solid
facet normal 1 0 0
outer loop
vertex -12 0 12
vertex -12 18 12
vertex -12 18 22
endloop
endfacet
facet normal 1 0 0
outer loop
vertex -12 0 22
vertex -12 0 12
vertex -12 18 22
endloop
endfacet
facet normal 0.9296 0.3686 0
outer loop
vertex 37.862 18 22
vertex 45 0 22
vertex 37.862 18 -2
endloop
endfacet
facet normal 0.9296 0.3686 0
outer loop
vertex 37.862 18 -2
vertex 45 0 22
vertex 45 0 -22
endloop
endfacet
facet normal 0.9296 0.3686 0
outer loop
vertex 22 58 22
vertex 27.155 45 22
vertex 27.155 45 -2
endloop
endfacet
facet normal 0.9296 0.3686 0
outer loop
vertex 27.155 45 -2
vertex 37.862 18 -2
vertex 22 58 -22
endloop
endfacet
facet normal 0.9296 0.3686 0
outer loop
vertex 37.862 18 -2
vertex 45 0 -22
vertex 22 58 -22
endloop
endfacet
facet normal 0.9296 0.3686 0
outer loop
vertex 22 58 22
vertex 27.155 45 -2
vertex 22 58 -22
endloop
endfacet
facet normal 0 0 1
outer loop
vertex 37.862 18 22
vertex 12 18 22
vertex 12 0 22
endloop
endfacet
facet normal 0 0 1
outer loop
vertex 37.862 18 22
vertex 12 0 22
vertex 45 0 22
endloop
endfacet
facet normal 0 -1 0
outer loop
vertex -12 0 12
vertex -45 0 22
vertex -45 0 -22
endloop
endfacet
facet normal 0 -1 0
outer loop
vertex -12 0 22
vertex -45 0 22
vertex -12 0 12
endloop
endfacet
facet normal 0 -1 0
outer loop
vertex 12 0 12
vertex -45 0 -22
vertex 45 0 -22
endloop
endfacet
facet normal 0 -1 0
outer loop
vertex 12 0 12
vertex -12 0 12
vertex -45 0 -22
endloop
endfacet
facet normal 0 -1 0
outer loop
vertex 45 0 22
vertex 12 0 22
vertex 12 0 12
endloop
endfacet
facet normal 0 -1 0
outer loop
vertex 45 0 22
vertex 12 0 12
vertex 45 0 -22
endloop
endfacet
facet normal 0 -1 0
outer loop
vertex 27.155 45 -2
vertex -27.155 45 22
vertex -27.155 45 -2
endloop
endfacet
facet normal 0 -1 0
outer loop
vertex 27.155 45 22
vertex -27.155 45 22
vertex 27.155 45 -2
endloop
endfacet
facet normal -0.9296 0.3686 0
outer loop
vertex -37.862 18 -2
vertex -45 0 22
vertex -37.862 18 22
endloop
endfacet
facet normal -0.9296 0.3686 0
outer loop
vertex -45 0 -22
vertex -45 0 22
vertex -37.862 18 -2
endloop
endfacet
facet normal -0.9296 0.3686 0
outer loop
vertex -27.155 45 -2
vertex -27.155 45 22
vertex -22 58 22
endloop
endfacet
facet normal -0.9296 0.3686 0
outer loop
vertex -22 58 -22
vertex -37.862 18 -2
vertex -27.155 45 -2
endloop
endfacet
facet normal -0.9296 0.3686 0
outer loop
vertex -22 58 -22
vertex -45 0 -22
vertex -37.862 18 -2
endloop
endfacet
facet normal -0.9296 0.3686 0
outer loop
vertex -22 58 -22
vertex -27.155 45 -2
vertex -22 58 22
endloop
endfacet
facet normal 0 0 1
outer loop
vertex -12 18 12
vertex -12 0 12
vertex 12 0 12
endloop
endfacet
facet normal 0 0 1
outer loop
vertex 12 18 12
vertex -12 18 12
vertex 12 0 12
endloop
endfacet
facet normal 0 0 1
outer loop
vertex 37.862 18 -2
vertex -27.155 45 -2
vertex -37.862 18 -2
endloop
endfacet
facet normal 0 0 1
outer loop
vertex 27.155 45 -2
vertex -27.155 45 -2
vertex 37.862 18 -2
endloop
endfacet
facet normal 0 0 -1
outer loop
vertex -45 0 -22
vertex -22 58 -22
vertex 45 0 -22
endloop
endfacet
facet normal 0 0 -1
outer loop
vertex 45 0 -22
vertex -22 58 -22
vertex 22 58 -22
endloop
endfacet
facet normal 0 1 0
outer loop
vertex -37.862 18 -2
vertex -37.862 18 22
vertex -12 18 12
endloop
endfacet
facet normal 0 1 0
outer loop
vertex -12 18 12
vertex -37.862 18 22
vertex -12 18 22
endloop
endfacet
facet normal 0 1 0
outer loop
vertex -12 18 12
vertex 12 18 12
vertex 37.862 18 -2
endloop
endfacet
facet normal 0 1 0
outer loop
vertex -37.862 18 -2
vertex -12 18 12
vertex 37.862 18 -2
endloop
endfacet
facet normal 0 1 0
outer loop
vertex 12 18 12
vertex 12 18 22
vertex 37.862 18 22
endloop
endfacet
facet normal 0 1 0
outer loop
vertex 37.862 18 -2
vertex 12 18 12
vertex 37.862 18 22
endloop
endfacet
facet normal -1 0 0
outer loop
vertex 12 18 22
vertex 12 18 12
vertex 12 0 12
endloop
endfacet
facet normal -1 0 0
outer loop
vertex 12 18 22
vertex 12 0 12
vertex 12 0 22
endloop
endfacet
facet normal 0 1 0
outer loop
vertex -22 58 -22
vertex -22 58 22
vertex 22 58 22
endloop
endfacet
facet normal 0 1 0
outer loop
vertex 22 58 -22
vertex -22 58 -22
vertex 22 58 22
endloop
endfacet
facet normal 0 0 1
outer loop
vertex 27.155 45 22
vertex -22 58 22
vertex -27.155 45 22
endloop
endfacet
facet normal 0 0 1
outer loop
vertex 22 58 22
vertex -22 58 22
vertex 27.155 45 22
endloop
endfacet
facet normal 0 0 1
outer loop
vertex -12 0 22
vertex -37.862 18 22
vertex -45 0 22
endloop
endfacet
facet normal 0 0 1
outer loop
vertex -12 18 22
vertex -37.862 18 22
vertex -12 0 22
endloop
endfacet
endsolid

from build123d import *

# Parameters (mm, degrees)
SKETCH1_W           = 90
SKETCH1_H           = 58
BOSS_EXTRUDE1_DEPTH = 22
SKETCH2_W           = 90
SKETCH2_H           = 27
CUT_EXTRUDE1_DEPTH  = 24
CUT_EXTRUDE2_DEPTH  = 86.586213843
CUT_EXTRUDE3_REACH  = 78.636
SKETCH4_W           = 24
SKETCH4_H           = 10


with BuildPart() as part:
    # Sketch1 → Boss-Extrude1 (new, symmetric)
    with BuildSketch(Plane.XY):
        with Locations((0, 29)):
            Rectangle(SKETCH1_W, SKETCH1_H)
    extrude(amount=BOSS_EXTRUDE1_DEPTH, both=True)

    # Sketch2 → Cut-Extrude1 (cut)
    with BuildSketch(Plane.XY.offset(22)):
        with Locations((0, 31.5)):
            Rectangle(SKETCH2_W, SKETCH2_H)
    extrude(amount=-CUT_EXTRUDE1_DEPTH, mode=Mode.SUBTRACT)

    # Sketch3 → Cut-Extrude2 (cut, through all)
    with BuildSketch(Plane(origin=(0, 0, -22), x_dir=(-1, 0, 0), z_dir=(0, 0, -1))):
        Polygon((-45, 58), (-45, 0), (-22, 58), align=None)
    cut_extrude2 = extrude(amount=-CUT_EXTRUDE2_DEPTH, mode=Mode.SUBTRACT)

    # Mirror1: Cut-Extrude2 across plane
    add(cut_extrude2.mirror(Plane(origin=(0, 0, 0), x_dir=(0, 0, 1), z_dir=(1, 0, 0))), mode=Mode.SUBTRACT)

    # Sketch4 → Cut-Extrude3 (cut, up to next)
    with BuildSketch(Plane.XZ, mode=Mode.PRIVATE) as cut_extrude3_sk1:
        with Locations((0, 17)):
            Rectangle(SKETCH4_W, SKETCH4_H)
    cut_extrude3_tool1 = extrude(cut_extrude3_sk1.sketch, amount=-CUT_EXTRUDE3_REACH, mode=Mode.PRIVATE) & part.part
    add(cut_extrude3_tool1.solids().sort_by_distance((0, 0, 17))[0], mode=Mode.SUBTRACT)


solid = part.part
